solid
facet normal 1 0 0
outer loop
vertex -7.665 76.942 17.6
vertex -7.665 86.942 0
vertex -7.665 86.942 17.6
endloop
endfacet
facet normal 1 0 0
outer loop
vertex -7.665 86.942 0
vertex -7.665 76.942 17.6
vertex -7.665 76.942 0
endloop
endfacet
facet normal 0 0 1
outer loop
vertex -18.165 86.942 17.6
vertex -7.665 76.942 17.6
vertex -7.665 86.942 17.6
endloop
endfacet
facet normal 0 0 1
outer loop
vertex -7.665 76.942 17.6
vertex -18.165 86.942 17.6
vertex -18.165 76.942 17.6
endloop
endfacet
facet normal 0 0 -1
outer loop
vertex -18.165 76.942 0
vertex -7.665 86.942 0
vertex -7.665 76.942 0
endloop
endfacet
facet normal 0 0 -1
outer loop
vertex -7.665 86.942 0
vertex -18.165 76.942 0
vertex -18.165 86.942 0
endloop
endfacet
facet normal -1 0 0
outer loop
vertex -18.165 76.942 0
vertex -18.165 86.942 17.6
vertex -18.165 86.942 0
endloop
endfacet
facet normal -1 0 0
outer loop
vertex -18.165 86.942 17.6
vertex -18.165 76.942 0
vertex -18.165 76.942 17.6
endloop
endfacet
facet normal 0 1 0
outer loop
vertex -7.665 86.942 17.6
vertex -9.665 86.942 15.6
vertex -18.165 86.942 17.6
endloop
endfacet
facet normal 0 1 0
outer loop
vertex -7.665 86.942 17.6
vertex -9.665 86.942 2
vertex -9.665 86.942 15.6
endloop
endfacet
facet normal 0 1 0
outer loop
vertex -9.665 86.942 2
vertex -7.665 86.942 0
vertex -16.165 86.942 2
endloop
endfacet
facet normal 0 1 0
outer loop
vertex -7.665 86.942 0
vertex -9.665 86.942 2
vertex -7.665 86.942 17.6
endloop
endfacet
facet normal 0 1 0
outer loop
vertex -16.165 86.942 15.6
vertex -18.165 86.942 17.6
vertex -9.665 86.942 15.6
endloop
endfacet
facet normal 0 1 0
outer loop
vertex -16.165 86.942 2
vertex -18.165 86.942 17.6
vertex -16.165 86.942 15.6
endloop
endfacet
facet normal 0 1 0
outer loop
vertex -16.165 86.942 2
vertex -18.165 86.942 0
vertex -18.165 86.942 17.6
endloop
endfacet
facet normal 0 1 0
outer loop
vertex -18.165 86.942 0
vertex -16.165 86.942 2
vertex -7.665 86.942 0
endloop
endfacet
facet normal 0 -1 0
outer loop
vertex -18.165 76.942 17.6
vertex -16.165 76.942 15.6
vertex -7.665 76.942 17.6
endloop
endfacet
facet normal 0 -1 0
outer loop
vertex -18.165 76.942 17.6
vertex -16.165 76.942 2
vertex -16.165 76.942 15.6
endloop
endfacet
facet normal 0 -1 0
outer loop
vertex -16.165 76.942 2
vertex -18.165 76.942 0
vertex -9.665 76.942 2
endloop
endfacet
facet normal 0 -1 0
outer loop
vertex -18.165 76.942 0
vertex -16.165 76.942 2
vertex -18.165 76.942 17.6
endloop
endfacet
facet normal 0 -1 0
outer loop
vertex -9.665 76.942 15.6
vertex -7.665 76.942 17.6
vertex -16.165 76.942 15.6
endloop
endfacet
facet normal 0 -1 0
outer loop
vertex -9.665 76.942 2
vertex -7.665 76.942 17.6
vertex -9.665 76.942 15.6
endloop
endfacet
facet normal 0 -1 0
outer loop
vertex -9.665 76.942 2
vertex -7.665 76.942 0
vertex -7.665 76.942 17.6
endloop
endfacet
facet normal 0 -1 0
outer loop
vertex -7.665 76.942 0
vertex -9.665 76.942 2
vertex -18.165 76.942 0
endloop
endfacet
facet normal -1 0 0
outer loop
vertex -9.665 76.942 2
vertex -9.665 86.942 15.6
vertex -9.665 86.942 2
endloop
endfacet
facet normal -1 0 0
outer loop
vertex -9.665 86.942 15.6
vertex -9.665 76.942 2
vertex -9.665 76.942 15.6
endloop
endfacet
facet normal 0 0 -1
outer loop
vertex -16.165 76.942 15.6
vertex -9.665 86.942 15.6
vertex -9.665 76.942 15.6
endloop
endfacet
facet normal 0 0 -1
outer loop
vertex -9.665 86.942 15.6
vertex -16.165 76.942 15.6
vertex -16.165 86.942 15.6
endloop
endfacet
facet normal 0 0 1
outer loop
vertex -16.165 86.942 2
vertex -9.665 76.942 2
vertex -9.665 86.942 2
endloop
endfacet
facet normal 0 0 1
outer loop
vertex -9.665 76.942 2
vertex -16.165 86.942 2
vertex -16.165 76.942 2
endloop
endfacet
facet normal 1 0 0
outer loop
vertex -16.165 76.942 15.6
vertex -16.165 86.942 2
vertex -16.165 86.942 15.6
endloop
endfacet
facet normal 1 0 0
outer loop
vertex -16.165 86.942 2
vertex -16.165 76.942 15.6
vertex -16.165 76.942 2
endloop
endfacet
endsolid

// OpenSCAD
difference () {
  translate ([-12.915065530373635, 81.94231817471378, 8.8]) {
    cube ([10.5, 10.0, 17.6], center=true);
  }
  translate ([-12.915065530373635, 81.94231817471378, 8.8]) {
    cube ([6.5, 10.0, 13.6], center=true);
  }
}
